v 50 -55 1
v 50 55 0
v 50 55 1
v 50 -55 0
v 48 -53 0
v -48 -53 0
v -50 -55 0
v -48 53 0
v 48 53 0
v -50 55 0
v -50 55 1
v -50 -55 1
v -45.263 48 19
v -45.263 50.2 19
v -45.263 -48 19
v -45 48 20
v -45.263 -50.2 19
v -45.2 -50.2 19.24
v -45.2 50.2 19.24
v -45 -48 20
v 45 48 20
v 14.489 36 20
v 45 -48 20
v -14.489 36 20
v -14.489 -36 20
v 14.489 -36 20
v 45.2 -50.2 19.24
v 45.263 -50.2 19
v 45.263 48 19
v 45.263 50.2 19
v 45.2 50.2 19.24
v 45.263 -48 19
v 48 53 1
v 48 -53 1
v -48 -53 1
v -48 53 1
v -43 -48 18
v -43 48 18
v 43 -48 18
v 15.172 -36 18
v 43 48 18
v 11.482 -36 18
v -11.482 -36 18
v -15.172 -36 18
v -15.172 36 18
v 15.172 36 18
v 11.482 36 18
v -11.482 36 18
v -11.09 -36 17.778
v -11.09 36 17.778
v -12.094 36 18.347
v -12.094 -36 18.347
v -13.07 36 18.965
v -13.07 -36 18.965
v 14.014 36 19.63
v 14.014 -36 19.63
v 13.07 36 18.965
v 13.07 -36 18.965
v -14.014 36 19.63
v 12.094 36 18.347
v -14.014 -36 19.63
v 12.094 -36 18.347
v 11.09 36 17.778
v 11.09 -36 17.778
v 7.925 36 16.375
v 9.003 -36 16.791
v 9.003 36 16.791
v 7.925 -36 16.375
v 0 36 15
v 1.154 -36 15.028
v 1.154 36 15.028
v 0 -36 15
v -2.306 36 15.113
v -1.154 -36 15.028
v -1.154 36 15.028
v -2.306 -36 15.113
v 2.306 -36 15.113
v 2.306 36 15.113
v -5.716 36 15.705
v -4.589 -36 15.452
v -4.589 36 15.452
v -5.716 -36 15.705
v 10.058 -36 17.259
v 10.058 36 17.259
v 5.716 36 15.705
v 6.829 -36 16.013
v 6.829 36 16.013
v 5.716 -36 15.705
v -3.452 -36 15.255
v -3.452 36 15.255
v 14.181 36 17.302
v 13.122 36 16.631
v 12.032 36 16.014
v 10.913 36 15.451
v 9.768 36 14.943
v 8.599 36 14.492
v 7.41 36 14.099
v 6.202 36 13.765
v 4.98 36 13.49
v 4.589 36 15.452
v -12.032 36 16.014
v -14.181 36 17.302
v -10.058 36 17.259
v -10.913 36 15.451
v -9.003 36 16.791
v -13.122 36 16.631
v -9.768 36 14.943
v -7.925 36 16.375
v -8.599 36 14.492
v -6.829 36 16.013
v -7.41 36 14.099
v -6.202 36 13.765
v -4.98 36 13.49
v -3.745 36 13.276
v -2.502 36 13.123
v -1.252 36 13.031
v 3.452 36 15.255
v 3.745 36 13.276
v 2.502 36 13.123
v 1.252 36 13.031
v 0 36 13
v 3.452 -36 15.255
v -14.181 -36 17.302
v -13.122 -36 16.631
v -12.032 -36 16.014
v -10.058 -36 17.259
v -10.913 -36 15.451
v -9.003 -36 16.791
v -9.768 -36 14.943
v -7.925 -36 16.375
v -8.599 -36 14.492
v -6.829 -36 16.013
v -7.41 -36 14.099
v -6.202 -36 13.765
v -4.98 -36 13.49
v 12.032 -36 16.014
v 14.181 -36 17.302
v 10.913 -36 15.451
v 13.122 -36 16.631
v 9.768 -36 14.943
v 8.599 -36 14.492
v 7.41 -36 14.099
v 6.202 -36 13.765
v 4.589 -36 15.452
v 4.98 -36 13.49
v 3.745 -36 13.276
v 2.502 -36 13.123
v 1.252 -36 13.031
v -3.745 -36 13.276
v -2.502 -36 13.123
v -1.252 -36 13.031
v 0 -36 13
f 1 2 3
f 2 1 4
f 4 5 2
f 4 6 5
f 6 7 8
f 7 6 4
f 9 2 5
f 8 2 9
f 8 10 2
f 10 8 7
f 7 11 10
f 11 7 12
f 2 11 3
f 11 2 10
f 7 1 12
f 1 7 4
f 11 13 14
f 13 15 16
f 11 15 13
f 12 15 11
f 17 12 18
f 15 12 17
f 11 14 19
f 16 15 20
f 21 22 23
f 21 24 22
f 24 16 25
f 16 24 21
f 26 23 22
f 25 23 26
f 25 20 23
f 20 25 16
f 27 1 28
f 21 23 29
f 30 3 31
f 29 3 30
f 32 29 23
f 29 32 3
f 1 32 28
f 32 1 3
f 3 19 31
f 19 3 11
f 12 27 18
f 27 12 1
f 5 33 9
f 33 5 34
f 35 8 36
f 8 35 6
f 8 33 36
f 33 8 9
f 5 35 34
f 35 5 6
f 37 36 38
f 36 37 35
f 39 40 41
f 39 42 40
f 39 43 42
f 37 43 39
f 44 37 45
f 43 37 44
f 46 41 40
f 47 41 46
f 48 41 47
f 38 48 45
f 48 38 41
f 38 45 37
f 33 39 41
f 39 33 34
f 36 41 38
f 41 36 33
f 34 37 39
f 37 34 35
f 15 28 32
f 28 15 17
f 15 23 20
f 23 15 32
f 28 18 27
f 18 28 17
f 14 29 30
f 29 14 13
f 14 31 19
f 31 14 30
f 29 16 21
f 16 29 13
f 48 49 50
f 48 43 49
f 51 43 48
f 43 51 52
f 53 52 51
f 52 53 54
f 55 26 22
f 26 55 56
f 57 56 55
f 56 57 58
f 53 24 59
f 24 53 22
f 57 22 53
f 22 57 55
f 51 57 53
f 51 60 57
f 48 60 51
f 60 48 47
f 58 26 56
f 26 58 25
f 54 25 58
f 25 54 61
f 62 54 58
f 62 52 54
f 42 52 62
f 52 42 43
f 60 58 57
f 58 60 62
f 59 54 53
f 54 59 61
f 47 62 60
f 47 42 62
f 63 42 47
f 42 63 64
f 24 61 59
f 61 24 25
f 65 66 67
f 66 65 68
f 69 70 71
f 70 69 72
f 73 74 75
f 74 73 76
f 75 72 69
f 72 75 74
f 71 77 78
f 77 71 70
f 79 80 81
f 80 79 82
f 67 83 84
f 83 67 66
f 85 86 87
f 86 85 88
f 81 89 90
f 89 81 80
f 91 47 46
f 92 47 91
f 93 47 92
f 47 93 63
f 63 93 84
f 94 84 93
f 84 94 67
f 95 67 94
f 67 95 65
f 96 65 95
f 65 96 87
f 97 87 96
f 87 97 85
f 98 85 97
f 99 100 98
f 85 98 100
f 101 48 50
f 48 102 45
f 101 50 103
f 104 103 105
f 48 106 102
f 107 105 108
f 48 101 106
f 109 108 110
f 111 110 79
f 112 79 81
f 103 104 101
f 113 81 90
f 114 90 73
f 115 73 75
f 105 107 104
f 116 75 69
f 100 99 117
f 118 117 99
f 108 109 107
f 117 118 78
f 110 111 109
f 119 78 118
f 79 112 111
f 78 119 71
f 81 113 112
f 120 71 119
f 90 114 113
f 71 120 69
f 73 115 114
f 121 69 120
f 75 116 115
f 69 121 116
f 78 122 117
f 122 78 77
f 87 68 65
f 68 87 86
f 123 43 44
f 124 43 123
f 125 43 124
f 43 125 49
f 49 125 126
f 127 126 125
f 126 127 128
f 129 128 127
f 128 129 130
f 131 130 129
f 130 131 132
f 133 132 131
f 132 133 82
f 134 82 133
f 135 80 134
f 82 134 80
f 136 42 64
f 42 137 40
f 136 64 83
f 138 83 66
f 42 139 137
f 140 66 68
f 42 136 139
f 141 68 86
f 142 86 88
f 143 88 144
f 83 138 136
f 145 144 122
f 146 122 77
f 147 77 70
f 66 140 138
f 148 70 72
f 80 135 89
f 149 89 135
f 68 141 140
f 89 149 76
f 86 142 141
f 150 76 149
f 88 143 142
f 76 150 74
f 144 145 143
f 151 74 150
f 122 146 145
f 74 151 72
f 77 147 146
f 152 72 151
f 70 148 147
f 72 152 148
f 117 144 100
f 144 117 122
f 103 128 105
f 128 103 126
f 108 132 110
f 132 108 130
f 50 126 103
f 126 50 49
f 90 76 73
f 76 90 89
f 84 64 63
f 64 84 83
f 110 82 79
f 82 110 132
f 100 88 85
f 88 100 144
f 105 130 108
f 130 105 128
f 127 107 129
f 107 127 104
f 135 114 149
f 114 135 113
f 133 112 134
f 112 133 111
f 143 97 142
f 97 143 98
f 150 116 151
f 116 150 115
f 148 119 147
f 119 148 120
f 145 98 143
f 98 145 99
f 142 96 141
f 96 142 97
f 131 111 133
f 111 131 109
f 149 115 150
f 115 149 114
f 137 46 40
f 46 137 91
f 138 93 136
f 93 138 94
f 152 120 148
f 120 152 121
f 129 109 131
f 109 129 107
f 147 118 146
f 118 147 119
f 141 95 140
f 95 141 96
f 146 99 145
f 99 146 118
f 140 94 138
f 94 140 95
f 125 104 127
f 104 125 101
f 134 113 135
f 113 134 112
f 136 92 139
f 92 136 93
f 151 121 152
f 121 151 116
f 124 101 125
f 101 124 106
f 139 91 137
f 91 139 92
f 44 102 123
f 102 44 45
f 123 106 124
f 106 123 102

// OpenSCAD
// ---------------- User parameters ----------------------------
wall_thickness = 2;      // wall + top thickness  (mm)
height         = 20;     // total outside height  (mm)

top_x  = 90;             // outer size at z = height (mm)
top_y  = 100;

bottom_x = 100;           // outer size just above the lip (mm)
bottom_y = 110;

lip_h        = 1;        // vertical lip height (mm)

// --- Wheel trough -------------------------------------------
trough_len   = 72;       // length along Y (mm)
trough_w     = 29;       // chord width along X (mm)
trough_d     = 5;        // sagitta / depth (mm)
//--------------------------------------------------------------

// ------------- Derived dimensions ---------------------------
inner_top_x     = top_x  - 2*wall_thickness;
inner_top_y     = top_y  - 2*wall_thickness;

inner_bottom_x  = inner_top_x + (bottom_x - top_x);
inner_bottom_y  = inner_top_y + (bottom_y - top_y);

taper_h         = height - lip_h;   // height of the tapered section

groove_w     = wall_thickness * 1.1;        // groove width   (mm)
groove_d     = lip_h;        // groove depth   (mm)

outer_scale = [ top_x  / bottom_x,
                top_y  / bottom_y ];

inner_scale = [ inner_top_x / inner_bottom_x,
                inner_top_y / inner_bottom_y ];

// distance between centre-lines (mm)
groove_pitch = inner_bottom_x + 2*(1/2)*groove_w;
// Half distance from the Y-axis to each groove centre
groove_off = groove_pitch / 2;

// radius that gives the requested width & depth
trough_r     = (trough_d*trough_d +
                (trough_w/2)*(trough_w/2)) / (2*trough_d);
// vertical offset of the cylinder centre above the top plane
trough_off   = trough_r - trough_d;

// -------------- helper modules ------------------------------
module outer_shell() {
    // vertical lip
    translate([-bottom_x/2, -bottom_y/2, 0])
        cube([bottom_x, bottom_y, lip_h]);

    // tapered part above the lip
    translate([0, 0, lip_h])
        linear_extrude(height = taper_h,
                       scale   = outer_scale,
                       center  = false)
            square([bottom_x, bottom_y], center = true);
}

module inner_cavity() {
    // cavity under the lip
    translate([-inner_bottom_x/2, -inner_bottom_y/2, 0])
        cube([inner_bottom_x, inner_bottom_y, lip_h]);

    // tapered cavity, stops 2 mm below the top
    translate([0, 0, lip_h])
        linear_extrude(height = taper_h - wall_thickness,
                       scale   = inner_scale,
                       center  = false)
            square([inner_bottom_x, inner_bottom_y], center = true);
}

module top_grooves() {
    // a groove is simply a shallow rectangular cut
    groove_len = bottom_x + 10;               // long enough to overshoot
    for (y = [ -groove_off,  groove_off ])    // two positions, symmetric
        translate([ -groove_len/2, y - groove_w/2,
                    height - groove_d ])      // z position: 1 mm into top
            cube([ groove_len, groove_w, groove_d ]);
}

module wheel_trough() {
    // Cylinder axis along Y; length = trough_len
    translate([ 0, 0, height + trough_off ])
        rotate([90, 0, 0])            // z-axis → y-axis
            cylinder(r = trough_r,
                     h = trough_len,
                     center = true,
                     $fn = 128);      // fine enough for a smooth curve
}

module wheel_trough_outer() {
    translate([ 0, 0, height + trough_off ])
        rotate([90, 0, 0])            // z-axis → y-axis
            cylinder(r = trough_r + wall_thickness,
                     h = trough_len,
                     center = true,
                     $fn = 128);      // fine enough for a smooth curve
}

// --------------- main model ---------------------------------
union() {
    difference() {
        union() {
            outer_shell();
        }
        union() {
            inner_cavity();   // hollows the inside
            top_grooves();    // cuts the two alignment grooves
            wheel_trough();
        }
    }
    difference() {
        wheel_trough_outer();
        union() {
            wheel_trough();
            translate([ -bottom_x/2, -bottom_y/2, height ])
                cube([ 100, 100, 100 ]);
        }
    }
}
